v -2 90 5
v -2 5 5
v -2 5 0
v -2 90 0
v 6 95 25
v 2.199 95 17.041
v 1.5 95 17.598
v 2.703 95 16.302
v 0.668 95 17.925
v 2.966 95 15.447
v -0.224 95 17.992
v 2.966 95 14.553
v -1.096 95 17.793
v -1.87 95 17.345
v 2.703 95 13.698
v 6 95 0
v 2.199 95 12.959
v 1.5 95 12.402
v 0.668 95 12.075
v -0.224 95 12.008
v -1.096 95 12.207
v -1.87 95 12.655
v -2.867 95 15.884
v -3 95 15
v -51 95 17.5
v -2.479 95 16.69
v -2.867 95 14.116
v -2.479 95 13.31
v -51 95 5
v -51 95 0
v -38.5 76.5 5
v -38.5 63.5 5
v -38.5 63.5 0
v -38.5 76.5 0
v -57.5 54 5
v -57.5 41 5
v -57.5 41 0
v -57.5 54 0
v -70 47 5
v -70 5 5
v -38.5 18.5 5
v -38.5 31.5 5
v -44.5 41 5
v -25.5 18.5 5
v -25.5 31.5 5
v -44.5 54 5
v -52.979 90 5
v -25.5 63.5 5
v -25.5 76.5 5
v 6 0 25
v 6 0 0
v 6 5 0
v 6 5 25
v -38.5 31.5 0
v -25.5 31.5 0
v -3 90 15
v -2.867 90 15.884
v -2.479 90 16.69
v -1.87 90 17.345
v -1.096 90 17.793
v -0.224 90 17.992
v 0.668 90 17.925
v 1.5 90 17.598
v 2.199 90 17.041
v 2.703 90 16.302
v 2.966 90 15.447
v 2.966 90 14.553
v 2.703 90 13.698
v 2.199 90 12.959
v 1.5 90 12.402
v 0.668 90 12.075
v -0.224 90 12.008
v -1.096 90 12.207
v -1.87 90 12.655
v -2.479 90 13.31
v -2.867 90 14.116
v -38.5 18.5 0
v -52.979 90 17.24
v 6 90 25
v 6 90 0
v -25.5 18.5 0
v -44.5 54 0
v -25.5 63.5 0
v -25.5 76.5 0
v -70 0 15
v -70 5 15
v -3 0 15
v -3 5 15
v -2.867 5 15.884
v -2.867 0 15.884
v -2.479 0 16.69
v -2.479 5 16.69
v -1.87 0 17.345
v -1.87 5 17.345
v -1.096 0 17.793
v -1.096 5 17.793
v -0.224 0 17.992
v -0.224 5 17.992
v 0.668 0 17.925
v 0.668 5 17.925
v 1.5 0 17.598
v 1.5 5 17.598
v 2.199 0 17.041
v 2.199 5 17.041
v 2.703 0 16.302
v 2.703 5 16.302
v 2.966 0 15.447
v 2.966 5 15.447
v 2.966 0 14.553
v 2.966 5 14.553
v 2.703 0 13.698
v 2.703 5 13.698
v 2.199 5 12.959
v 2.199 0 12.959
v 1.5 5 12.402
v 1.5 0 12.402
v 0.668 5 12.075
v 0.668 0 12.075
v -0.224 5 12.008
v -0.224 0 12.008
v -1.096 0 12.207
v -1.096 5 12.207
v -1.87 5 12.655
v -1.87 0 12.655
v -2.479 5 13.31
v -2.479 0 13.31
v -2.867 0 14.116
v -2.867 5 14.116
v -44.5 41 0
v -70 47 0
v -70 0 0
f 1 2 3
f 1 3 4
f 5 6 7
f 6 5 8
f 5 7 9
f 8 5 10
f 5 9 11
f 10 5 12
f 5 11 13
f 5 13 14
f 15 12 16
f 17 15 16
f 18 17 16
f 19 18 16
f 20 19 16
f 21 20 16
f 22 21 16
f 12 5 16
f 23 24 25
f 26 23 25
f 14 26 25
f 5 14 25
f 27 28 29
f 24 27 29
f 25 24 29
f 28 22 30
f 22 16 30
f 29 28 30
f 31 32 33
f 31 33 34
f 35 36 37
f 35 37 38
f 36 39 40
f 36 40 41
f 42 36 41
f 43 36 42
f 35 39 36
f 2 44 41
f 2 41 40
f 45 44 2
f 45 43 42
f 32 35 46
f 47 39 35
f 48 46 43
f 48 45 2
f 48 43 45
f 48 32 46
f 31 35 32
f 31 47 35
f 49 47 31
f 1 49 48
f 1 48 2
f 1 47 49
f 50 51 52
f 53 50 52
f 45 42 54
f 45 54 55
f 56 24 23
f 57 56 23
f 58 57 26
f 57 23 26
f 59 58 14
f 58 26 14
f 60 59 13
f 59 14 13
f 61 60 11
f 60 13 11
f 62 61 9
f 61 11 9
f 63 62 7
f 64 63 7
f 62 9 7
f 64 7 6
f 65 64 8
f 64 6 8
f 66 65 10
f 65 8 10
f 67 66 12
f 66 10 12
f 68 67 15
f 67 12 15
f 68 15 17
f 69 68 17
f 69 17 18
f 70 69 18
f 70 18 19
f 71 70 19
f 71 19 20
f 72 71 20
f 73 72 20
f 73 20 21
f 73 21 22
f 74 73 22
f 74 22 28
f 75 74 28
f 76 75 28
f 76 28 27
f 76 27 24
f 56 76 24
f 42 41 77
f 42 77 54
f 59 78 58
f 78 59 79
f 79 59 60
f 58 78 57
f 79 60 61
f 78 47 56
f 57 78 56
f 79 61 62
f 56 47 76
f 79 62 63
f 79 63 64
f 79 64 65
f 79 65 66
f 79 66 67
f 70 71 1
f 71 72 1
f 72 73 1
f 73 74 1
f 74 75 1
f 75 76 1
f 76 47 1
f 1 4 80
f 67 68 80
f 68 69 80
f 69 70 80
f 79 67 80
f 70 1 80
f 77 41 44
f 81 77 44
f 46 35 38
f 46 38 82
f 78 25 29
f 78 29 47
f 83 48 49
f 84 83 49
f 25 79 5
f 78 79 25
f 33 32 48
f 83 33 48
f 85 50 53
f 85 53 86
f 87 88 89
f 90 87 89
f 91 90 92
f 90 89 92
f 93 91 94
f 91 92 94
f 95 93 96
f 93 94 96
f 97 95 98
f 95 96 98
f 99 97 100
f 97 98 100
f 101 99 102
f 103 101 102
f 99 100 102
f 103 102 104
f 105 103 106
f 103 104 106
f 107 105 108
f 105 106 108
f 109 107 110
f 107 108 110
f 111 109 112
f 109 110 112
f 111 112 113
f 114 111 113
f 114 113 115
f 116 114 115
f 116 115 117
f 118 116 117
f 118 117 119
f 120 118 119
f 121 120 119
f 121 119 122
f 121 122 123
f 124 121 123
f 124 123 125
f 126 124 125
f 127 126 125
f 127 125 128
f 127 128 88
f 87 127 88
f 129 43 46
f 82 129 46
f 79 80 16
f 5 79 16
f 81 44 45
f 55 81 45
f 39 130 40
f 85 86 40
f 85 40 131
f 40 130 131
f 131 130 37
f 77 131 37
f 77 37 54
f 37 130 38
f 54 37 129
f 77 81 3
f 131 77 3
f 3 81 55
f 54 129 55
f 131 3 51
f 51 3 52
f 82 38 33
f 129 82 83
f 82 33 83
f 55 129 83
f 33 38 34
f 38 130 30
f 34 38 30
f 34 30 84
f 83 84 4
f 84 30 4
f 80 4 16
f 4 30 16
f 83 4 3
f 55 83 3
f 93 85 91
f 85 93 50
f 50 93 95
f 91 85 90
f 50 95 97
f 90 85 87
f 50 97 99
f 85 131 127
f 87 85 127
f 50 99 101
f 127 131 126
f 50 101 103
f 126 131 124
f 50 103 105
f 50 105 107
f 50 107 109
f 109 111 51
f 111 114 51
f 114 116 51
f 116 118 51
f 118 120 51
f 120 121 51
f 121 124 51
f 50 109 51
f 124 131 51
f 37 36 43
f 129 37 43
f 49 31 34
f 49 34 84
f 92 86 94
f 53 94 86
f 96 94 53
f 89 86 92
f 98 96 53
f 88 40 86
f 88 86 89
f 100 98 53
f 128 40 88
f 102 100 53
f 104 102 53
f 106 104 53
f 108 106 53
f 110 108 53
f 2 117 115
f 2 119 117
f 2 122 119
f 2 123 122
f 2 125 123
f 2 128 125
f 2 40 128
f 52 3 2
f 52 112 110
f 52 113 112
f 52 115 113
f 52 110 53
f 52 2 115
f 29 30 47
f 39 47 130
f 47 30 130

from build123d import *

# Parameters (mm, degrees)
BOSS_EXTRUDE1_DEPTH = 5
SKETCH2_W           = 13
SKETCH2_H           = 13
CUT_EXTRUDE1_DEPTH  = 119.11011811
SKETCH5_W           = 76
SKETCH5_H           = 5
BOSS_EXTRUDE3_DEPTH = 20
CUT_EXTRUDE2_DEPTH  = 121.623380818
SKETCH7_R           = 3
CUT_EXTRUDE4_DEPTH  = 121.623380818
SKETCH8_W           = 8
SKETCH8_H           = 85
CUT_EXTRUDE5_DEPTH  = 120.687092036


with BuildPart() as part:
    # Sketch1 → Boss-Extrude1 (new body)
    with BuildSketch(Plane.XY):
        Polygon((-70, 0), (6, 0), (6, 95), (-51, 95), (-70, 47), align=None)
    extrude(amount=BOSS_EXTRUDE1_DEPTH)

    # Sketch2 → Cut-Extrude1 (cut, through all)
    with BuildSketch(Plane.XY.offset(5)):
        with Locations((-32, 70)):
            Rectangle(SKETCH2_W, SKETCH2_H)
        with Locations((-32, 25)):
            Rectangle(SKETCH2_W, SKETCH2_H)
        with Locations((-51, 47.5)):
            Rectangle(SKETCH2_W, SKETCH2_H)
    extrude(amount=-CUT_EXTRUDE1_DEPTH, mode=Mode.SUBTRACT)

    # Sketch5 → Boss-Extrude3 (add)
    with BuildSketch(Plane.XY.offset(5)):
        Polygon((-51, 95), (-52.979166667, 90), (6, 90), (6, 95), align=None)
        with Locations((-32, 2.5)):
            Rectangle(SKETCH5_W, SKETCH5_H)
    extrude(amount=BOSS_EXTRUDE3_DEPTH)

    # Sketch6 → Cut-Extrude2 (cut, through all)
    with BuildSketch(Plane.XZ):
        Polygon((6, 25), (-70, 15), (-70, 25), align=None)
    extrude(amount=-CUT_EXTRUDE2_DEPTH, mode=Mode.SUBTRACT)

    # Sketch7 → Cut-Extrude4 (cut, through all)
    with BuildSketch(Plane(origin=(0, 95, 0), x_dir=(1, 0, 0), z_dir=(0, 1, 0))):
        with Locations(Location((0, -15, 0), (0, 0, 180))):
            Circle(SKETCH7_R)
    extrude(amount=-CUT_EXTRUDE4_DEPTH, mode=Mode.SUBTRACT)

    # Sketch8 → Cut-Extrude5 (cut, through all)
    with BuildSketch(Plane.XY.offset(5)):
        with Locations((2, 47.5)):
            Rectangle(SKETCH8_W, SKETCH8_H)
    extrude(amount=-CUT_EXTRUDE5_DEPTH, mode=Mode.SUBTRACT)


solid = part.part
